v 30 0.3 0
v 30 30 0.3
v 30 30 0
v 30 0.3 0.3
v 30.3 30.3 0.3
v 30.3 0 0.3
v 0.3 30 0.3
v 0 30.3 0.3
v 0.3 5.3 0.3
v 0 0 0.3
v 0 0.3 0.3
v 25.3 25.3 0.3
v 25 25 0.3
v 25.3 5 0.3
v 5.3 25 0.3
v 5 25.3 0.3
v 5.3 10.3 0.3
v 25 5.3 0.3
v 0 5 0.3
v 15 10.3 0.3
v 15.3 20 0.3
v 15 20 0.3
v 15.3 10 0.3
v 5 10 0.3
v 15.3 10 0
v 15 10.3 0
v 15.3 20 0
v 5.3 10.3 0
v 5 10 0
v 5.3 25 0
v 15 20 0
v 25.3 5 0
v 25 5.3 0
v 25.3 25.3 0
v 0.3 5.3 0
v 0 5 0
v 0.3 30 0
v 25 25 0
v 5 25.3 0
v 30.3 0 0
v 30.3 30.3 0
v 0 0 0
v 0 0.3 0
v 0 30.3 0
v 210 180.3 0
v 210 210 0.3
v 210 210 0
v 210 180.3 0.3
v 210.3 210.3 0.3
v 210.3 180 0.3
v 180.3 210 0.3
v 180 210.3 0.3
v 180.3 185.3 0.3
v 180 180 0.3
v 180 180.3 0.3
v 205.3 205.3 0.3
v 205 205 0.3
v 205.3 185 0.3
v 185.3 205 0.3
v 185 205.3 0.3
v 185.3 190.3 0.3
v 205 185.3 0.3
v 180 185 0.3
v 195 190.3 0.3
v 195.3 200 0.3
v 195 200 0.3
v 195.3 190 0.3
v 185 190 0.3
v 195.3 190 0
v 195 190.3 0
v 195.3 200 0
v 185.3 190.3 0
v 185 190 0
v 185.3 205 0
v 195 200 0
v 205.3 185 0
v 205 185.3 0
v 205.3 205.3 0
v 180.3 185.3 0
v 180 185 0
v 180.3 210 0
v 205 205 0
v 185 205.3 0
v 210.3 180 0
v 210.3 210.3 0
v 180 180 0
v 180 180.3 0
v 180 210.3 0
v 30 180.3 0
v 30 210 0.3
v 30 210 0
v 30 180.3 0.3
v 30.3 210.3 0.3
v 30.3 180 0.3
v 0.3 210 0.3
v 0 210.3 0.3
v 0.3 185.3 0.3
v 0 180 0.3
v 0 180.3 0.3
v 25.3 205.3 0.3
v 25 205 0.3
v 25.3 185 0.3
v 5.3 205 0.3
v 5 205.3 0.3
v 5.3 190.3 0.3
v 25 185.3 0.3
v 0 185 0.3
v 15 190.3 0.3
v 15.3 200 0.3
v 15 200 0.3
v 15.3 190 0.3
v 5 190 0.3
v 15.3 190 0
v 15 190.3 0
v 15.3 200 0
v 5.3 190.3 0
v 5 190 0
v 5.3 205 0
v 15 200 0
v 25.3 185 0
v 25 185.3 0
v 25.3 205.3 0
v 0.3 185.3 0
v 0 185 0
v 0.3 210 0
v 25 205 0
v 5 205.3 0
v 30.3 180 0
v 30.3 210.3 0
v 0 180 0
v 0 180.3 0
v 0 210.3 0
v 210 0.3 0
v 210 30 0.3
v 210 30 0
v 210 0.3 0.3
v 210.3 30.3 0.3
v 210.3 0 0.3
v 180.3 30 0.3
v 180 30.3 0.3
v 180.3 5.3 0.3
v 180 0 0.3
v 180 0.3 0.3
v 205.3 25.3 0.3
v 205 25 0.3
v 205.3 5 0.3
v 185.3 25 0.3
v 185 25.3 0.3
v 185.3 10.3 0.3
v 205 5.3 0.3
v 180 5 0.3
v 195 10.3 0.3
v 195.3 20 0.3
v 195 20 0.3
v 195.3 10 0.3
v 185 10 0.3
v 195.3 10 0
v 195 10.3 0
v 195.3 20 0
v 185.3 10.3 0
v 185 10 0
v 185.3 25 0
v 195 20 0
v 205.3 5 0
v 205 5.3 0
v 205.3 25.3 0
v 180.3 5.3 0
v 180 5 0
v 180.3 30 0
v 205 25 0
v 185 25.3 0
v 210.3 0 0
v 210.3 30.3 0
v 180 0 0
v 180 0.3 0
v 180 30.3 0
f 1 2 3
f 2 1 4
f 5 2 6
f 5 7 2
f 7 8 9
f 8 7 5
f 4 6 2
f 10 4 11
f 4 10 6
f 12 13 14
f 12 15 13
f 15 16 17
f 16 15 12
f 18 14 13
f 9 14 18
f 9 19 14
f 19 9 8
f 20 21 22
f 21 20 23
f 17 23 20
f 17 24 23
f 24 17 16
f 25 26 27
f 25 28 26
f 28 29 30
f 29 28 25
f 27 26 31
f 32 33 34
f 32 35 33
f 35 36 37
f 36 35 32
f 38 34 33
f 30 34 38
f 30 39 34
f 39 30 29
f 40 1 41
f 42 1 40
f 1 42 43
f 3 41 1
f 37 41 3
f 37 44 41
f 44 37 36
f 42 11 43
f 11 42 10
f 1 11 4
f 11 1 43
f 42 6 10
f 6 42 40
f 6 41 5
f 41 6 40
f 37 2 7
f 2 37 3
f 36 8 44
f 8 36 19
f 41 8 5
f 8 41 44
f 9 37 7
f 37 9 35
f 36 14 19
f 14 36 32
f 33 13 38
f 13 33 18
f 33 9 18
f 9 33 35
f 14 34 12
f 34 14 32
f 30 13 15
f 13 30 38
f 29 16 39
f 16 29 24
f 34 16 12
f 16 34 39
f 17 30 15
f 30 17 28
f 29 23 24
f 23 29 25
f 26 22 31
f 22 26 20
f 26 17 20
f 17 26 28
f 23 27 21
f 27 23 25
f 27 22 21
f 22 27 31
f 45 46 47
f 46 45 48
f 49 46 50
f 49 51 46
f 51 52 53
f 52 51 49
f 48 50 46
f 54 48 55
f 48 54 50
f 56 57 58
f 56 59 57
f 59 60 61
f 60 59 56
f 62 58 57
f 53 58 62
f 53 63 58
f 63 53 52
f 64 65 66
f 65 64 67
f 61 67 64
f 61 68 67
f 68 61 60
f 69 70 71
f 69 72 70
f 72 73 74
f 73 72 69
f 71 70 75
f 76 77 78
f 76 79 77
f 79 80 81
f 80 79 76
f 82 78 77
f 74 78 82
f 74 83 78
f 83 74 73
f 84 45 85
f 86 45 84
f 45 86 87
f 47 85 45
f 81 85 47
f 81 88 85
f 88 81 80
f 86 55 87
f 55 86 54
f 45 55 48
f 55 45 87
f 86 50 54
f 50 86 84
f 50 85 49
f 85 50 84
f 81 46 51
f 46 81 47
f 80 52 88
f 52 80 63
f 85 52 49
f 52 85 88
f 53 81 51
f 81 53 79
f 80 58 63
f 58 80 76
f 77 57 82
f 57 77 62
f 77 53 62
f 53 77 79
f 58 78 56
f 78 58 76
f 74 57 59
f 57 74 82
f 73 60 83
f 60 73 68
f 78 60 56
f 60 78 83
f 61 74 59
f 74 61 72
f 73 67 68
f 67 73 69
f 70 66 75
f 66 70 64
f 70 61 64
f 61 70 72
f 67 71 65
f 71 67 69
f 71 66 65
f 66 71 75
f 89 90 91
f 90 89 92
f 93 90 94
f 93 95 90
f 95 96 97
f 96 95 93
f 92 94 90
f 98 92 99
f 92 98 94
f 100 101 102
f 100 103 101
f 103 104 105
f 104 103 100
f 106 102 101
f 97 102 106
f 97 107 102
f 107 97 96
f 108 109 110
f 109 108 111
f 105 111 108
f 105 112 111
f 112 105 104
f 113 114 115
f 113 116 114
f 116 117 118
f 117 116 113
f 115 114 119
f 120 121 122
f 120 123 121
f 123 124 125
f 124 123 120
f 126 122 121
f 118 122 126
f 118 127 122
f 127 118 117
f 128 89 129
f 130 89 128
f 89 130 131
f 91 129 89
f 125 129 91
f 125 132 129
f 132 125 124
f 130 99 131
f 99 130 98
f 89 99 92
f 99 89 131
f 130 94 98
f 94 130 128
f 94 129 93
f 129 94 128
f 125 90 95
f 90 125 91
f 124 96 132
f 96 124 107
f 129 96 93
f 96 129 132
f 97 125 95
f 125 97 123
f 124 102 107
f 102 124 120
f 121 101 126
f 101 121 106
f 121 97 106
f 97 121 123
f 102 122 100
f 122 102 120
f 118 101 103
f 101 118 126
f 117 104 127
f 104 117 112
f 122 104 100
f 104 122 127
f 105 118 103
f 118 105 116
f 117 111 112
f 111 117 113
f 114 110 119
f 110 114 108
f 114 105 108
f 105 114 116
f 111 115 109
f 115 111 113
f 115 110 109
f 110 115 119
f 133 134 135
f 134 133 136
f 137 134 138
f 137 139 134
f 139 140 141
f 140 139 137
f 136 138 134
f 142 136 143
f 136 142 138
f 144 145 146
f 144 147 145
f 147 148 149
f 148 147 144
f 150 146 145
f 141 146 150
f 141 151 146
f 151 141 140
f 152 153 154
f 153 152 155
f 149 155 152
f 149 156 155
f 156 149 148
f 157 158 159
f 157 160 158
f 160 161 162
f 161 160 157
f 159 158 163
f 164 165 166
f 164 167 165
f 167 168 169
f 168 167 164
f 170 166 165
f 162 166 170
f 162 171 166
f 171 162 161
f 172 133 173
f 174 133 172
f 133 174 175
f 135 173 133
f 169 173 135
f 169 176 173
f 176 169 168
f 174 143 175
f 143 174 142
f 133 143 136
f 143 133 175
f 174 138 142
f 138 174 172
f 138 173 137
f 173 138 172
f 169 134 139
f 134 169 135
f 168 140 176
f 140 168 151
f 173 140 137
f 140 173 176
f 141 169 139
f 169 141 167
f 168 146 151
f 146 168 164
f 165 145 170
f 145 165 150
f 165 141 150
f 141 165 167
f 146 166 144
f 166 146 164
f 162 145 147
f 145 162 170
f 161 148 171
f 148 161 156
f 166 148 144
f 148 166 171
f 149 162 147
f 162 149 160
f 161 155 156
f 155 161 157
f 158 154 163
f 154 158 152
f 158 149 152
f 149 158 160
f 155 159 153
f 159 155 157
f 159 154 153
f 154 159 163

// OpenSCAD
module spiral() {
    cube([30, 0.3, 0.3]);

    translate([30, 0])
        cube([0.3, 30, 0.3]);
        
    translate([0, 30])   
        cube([30.3, 0.3, 0.3]);

    translate([0, 5])     
        cube([0.3, 25, 0.3]);
        
    translate([0, 5])     
        cube([25, 0.3, 0.3]);
        
    translate([25, 5])     
        cube([0.3, 20, 0.3]);
        
    translate([5, 25])     
        cube([20.3, 0.3, 0.3]);    
        
    translate([5, 10])     
        cube([0.3, 15, 0.3]);
        
    translate([5, 10])     
        cube([10, 0.3, 0.3]);
        
    translate([15, 10])     
        cube([0.3, 10, 0.3]);
}

spiral();

translate([180, 180])
    spiral();

translate([0, 180])
    spiral();

translate([180, 0])
    spiral();
